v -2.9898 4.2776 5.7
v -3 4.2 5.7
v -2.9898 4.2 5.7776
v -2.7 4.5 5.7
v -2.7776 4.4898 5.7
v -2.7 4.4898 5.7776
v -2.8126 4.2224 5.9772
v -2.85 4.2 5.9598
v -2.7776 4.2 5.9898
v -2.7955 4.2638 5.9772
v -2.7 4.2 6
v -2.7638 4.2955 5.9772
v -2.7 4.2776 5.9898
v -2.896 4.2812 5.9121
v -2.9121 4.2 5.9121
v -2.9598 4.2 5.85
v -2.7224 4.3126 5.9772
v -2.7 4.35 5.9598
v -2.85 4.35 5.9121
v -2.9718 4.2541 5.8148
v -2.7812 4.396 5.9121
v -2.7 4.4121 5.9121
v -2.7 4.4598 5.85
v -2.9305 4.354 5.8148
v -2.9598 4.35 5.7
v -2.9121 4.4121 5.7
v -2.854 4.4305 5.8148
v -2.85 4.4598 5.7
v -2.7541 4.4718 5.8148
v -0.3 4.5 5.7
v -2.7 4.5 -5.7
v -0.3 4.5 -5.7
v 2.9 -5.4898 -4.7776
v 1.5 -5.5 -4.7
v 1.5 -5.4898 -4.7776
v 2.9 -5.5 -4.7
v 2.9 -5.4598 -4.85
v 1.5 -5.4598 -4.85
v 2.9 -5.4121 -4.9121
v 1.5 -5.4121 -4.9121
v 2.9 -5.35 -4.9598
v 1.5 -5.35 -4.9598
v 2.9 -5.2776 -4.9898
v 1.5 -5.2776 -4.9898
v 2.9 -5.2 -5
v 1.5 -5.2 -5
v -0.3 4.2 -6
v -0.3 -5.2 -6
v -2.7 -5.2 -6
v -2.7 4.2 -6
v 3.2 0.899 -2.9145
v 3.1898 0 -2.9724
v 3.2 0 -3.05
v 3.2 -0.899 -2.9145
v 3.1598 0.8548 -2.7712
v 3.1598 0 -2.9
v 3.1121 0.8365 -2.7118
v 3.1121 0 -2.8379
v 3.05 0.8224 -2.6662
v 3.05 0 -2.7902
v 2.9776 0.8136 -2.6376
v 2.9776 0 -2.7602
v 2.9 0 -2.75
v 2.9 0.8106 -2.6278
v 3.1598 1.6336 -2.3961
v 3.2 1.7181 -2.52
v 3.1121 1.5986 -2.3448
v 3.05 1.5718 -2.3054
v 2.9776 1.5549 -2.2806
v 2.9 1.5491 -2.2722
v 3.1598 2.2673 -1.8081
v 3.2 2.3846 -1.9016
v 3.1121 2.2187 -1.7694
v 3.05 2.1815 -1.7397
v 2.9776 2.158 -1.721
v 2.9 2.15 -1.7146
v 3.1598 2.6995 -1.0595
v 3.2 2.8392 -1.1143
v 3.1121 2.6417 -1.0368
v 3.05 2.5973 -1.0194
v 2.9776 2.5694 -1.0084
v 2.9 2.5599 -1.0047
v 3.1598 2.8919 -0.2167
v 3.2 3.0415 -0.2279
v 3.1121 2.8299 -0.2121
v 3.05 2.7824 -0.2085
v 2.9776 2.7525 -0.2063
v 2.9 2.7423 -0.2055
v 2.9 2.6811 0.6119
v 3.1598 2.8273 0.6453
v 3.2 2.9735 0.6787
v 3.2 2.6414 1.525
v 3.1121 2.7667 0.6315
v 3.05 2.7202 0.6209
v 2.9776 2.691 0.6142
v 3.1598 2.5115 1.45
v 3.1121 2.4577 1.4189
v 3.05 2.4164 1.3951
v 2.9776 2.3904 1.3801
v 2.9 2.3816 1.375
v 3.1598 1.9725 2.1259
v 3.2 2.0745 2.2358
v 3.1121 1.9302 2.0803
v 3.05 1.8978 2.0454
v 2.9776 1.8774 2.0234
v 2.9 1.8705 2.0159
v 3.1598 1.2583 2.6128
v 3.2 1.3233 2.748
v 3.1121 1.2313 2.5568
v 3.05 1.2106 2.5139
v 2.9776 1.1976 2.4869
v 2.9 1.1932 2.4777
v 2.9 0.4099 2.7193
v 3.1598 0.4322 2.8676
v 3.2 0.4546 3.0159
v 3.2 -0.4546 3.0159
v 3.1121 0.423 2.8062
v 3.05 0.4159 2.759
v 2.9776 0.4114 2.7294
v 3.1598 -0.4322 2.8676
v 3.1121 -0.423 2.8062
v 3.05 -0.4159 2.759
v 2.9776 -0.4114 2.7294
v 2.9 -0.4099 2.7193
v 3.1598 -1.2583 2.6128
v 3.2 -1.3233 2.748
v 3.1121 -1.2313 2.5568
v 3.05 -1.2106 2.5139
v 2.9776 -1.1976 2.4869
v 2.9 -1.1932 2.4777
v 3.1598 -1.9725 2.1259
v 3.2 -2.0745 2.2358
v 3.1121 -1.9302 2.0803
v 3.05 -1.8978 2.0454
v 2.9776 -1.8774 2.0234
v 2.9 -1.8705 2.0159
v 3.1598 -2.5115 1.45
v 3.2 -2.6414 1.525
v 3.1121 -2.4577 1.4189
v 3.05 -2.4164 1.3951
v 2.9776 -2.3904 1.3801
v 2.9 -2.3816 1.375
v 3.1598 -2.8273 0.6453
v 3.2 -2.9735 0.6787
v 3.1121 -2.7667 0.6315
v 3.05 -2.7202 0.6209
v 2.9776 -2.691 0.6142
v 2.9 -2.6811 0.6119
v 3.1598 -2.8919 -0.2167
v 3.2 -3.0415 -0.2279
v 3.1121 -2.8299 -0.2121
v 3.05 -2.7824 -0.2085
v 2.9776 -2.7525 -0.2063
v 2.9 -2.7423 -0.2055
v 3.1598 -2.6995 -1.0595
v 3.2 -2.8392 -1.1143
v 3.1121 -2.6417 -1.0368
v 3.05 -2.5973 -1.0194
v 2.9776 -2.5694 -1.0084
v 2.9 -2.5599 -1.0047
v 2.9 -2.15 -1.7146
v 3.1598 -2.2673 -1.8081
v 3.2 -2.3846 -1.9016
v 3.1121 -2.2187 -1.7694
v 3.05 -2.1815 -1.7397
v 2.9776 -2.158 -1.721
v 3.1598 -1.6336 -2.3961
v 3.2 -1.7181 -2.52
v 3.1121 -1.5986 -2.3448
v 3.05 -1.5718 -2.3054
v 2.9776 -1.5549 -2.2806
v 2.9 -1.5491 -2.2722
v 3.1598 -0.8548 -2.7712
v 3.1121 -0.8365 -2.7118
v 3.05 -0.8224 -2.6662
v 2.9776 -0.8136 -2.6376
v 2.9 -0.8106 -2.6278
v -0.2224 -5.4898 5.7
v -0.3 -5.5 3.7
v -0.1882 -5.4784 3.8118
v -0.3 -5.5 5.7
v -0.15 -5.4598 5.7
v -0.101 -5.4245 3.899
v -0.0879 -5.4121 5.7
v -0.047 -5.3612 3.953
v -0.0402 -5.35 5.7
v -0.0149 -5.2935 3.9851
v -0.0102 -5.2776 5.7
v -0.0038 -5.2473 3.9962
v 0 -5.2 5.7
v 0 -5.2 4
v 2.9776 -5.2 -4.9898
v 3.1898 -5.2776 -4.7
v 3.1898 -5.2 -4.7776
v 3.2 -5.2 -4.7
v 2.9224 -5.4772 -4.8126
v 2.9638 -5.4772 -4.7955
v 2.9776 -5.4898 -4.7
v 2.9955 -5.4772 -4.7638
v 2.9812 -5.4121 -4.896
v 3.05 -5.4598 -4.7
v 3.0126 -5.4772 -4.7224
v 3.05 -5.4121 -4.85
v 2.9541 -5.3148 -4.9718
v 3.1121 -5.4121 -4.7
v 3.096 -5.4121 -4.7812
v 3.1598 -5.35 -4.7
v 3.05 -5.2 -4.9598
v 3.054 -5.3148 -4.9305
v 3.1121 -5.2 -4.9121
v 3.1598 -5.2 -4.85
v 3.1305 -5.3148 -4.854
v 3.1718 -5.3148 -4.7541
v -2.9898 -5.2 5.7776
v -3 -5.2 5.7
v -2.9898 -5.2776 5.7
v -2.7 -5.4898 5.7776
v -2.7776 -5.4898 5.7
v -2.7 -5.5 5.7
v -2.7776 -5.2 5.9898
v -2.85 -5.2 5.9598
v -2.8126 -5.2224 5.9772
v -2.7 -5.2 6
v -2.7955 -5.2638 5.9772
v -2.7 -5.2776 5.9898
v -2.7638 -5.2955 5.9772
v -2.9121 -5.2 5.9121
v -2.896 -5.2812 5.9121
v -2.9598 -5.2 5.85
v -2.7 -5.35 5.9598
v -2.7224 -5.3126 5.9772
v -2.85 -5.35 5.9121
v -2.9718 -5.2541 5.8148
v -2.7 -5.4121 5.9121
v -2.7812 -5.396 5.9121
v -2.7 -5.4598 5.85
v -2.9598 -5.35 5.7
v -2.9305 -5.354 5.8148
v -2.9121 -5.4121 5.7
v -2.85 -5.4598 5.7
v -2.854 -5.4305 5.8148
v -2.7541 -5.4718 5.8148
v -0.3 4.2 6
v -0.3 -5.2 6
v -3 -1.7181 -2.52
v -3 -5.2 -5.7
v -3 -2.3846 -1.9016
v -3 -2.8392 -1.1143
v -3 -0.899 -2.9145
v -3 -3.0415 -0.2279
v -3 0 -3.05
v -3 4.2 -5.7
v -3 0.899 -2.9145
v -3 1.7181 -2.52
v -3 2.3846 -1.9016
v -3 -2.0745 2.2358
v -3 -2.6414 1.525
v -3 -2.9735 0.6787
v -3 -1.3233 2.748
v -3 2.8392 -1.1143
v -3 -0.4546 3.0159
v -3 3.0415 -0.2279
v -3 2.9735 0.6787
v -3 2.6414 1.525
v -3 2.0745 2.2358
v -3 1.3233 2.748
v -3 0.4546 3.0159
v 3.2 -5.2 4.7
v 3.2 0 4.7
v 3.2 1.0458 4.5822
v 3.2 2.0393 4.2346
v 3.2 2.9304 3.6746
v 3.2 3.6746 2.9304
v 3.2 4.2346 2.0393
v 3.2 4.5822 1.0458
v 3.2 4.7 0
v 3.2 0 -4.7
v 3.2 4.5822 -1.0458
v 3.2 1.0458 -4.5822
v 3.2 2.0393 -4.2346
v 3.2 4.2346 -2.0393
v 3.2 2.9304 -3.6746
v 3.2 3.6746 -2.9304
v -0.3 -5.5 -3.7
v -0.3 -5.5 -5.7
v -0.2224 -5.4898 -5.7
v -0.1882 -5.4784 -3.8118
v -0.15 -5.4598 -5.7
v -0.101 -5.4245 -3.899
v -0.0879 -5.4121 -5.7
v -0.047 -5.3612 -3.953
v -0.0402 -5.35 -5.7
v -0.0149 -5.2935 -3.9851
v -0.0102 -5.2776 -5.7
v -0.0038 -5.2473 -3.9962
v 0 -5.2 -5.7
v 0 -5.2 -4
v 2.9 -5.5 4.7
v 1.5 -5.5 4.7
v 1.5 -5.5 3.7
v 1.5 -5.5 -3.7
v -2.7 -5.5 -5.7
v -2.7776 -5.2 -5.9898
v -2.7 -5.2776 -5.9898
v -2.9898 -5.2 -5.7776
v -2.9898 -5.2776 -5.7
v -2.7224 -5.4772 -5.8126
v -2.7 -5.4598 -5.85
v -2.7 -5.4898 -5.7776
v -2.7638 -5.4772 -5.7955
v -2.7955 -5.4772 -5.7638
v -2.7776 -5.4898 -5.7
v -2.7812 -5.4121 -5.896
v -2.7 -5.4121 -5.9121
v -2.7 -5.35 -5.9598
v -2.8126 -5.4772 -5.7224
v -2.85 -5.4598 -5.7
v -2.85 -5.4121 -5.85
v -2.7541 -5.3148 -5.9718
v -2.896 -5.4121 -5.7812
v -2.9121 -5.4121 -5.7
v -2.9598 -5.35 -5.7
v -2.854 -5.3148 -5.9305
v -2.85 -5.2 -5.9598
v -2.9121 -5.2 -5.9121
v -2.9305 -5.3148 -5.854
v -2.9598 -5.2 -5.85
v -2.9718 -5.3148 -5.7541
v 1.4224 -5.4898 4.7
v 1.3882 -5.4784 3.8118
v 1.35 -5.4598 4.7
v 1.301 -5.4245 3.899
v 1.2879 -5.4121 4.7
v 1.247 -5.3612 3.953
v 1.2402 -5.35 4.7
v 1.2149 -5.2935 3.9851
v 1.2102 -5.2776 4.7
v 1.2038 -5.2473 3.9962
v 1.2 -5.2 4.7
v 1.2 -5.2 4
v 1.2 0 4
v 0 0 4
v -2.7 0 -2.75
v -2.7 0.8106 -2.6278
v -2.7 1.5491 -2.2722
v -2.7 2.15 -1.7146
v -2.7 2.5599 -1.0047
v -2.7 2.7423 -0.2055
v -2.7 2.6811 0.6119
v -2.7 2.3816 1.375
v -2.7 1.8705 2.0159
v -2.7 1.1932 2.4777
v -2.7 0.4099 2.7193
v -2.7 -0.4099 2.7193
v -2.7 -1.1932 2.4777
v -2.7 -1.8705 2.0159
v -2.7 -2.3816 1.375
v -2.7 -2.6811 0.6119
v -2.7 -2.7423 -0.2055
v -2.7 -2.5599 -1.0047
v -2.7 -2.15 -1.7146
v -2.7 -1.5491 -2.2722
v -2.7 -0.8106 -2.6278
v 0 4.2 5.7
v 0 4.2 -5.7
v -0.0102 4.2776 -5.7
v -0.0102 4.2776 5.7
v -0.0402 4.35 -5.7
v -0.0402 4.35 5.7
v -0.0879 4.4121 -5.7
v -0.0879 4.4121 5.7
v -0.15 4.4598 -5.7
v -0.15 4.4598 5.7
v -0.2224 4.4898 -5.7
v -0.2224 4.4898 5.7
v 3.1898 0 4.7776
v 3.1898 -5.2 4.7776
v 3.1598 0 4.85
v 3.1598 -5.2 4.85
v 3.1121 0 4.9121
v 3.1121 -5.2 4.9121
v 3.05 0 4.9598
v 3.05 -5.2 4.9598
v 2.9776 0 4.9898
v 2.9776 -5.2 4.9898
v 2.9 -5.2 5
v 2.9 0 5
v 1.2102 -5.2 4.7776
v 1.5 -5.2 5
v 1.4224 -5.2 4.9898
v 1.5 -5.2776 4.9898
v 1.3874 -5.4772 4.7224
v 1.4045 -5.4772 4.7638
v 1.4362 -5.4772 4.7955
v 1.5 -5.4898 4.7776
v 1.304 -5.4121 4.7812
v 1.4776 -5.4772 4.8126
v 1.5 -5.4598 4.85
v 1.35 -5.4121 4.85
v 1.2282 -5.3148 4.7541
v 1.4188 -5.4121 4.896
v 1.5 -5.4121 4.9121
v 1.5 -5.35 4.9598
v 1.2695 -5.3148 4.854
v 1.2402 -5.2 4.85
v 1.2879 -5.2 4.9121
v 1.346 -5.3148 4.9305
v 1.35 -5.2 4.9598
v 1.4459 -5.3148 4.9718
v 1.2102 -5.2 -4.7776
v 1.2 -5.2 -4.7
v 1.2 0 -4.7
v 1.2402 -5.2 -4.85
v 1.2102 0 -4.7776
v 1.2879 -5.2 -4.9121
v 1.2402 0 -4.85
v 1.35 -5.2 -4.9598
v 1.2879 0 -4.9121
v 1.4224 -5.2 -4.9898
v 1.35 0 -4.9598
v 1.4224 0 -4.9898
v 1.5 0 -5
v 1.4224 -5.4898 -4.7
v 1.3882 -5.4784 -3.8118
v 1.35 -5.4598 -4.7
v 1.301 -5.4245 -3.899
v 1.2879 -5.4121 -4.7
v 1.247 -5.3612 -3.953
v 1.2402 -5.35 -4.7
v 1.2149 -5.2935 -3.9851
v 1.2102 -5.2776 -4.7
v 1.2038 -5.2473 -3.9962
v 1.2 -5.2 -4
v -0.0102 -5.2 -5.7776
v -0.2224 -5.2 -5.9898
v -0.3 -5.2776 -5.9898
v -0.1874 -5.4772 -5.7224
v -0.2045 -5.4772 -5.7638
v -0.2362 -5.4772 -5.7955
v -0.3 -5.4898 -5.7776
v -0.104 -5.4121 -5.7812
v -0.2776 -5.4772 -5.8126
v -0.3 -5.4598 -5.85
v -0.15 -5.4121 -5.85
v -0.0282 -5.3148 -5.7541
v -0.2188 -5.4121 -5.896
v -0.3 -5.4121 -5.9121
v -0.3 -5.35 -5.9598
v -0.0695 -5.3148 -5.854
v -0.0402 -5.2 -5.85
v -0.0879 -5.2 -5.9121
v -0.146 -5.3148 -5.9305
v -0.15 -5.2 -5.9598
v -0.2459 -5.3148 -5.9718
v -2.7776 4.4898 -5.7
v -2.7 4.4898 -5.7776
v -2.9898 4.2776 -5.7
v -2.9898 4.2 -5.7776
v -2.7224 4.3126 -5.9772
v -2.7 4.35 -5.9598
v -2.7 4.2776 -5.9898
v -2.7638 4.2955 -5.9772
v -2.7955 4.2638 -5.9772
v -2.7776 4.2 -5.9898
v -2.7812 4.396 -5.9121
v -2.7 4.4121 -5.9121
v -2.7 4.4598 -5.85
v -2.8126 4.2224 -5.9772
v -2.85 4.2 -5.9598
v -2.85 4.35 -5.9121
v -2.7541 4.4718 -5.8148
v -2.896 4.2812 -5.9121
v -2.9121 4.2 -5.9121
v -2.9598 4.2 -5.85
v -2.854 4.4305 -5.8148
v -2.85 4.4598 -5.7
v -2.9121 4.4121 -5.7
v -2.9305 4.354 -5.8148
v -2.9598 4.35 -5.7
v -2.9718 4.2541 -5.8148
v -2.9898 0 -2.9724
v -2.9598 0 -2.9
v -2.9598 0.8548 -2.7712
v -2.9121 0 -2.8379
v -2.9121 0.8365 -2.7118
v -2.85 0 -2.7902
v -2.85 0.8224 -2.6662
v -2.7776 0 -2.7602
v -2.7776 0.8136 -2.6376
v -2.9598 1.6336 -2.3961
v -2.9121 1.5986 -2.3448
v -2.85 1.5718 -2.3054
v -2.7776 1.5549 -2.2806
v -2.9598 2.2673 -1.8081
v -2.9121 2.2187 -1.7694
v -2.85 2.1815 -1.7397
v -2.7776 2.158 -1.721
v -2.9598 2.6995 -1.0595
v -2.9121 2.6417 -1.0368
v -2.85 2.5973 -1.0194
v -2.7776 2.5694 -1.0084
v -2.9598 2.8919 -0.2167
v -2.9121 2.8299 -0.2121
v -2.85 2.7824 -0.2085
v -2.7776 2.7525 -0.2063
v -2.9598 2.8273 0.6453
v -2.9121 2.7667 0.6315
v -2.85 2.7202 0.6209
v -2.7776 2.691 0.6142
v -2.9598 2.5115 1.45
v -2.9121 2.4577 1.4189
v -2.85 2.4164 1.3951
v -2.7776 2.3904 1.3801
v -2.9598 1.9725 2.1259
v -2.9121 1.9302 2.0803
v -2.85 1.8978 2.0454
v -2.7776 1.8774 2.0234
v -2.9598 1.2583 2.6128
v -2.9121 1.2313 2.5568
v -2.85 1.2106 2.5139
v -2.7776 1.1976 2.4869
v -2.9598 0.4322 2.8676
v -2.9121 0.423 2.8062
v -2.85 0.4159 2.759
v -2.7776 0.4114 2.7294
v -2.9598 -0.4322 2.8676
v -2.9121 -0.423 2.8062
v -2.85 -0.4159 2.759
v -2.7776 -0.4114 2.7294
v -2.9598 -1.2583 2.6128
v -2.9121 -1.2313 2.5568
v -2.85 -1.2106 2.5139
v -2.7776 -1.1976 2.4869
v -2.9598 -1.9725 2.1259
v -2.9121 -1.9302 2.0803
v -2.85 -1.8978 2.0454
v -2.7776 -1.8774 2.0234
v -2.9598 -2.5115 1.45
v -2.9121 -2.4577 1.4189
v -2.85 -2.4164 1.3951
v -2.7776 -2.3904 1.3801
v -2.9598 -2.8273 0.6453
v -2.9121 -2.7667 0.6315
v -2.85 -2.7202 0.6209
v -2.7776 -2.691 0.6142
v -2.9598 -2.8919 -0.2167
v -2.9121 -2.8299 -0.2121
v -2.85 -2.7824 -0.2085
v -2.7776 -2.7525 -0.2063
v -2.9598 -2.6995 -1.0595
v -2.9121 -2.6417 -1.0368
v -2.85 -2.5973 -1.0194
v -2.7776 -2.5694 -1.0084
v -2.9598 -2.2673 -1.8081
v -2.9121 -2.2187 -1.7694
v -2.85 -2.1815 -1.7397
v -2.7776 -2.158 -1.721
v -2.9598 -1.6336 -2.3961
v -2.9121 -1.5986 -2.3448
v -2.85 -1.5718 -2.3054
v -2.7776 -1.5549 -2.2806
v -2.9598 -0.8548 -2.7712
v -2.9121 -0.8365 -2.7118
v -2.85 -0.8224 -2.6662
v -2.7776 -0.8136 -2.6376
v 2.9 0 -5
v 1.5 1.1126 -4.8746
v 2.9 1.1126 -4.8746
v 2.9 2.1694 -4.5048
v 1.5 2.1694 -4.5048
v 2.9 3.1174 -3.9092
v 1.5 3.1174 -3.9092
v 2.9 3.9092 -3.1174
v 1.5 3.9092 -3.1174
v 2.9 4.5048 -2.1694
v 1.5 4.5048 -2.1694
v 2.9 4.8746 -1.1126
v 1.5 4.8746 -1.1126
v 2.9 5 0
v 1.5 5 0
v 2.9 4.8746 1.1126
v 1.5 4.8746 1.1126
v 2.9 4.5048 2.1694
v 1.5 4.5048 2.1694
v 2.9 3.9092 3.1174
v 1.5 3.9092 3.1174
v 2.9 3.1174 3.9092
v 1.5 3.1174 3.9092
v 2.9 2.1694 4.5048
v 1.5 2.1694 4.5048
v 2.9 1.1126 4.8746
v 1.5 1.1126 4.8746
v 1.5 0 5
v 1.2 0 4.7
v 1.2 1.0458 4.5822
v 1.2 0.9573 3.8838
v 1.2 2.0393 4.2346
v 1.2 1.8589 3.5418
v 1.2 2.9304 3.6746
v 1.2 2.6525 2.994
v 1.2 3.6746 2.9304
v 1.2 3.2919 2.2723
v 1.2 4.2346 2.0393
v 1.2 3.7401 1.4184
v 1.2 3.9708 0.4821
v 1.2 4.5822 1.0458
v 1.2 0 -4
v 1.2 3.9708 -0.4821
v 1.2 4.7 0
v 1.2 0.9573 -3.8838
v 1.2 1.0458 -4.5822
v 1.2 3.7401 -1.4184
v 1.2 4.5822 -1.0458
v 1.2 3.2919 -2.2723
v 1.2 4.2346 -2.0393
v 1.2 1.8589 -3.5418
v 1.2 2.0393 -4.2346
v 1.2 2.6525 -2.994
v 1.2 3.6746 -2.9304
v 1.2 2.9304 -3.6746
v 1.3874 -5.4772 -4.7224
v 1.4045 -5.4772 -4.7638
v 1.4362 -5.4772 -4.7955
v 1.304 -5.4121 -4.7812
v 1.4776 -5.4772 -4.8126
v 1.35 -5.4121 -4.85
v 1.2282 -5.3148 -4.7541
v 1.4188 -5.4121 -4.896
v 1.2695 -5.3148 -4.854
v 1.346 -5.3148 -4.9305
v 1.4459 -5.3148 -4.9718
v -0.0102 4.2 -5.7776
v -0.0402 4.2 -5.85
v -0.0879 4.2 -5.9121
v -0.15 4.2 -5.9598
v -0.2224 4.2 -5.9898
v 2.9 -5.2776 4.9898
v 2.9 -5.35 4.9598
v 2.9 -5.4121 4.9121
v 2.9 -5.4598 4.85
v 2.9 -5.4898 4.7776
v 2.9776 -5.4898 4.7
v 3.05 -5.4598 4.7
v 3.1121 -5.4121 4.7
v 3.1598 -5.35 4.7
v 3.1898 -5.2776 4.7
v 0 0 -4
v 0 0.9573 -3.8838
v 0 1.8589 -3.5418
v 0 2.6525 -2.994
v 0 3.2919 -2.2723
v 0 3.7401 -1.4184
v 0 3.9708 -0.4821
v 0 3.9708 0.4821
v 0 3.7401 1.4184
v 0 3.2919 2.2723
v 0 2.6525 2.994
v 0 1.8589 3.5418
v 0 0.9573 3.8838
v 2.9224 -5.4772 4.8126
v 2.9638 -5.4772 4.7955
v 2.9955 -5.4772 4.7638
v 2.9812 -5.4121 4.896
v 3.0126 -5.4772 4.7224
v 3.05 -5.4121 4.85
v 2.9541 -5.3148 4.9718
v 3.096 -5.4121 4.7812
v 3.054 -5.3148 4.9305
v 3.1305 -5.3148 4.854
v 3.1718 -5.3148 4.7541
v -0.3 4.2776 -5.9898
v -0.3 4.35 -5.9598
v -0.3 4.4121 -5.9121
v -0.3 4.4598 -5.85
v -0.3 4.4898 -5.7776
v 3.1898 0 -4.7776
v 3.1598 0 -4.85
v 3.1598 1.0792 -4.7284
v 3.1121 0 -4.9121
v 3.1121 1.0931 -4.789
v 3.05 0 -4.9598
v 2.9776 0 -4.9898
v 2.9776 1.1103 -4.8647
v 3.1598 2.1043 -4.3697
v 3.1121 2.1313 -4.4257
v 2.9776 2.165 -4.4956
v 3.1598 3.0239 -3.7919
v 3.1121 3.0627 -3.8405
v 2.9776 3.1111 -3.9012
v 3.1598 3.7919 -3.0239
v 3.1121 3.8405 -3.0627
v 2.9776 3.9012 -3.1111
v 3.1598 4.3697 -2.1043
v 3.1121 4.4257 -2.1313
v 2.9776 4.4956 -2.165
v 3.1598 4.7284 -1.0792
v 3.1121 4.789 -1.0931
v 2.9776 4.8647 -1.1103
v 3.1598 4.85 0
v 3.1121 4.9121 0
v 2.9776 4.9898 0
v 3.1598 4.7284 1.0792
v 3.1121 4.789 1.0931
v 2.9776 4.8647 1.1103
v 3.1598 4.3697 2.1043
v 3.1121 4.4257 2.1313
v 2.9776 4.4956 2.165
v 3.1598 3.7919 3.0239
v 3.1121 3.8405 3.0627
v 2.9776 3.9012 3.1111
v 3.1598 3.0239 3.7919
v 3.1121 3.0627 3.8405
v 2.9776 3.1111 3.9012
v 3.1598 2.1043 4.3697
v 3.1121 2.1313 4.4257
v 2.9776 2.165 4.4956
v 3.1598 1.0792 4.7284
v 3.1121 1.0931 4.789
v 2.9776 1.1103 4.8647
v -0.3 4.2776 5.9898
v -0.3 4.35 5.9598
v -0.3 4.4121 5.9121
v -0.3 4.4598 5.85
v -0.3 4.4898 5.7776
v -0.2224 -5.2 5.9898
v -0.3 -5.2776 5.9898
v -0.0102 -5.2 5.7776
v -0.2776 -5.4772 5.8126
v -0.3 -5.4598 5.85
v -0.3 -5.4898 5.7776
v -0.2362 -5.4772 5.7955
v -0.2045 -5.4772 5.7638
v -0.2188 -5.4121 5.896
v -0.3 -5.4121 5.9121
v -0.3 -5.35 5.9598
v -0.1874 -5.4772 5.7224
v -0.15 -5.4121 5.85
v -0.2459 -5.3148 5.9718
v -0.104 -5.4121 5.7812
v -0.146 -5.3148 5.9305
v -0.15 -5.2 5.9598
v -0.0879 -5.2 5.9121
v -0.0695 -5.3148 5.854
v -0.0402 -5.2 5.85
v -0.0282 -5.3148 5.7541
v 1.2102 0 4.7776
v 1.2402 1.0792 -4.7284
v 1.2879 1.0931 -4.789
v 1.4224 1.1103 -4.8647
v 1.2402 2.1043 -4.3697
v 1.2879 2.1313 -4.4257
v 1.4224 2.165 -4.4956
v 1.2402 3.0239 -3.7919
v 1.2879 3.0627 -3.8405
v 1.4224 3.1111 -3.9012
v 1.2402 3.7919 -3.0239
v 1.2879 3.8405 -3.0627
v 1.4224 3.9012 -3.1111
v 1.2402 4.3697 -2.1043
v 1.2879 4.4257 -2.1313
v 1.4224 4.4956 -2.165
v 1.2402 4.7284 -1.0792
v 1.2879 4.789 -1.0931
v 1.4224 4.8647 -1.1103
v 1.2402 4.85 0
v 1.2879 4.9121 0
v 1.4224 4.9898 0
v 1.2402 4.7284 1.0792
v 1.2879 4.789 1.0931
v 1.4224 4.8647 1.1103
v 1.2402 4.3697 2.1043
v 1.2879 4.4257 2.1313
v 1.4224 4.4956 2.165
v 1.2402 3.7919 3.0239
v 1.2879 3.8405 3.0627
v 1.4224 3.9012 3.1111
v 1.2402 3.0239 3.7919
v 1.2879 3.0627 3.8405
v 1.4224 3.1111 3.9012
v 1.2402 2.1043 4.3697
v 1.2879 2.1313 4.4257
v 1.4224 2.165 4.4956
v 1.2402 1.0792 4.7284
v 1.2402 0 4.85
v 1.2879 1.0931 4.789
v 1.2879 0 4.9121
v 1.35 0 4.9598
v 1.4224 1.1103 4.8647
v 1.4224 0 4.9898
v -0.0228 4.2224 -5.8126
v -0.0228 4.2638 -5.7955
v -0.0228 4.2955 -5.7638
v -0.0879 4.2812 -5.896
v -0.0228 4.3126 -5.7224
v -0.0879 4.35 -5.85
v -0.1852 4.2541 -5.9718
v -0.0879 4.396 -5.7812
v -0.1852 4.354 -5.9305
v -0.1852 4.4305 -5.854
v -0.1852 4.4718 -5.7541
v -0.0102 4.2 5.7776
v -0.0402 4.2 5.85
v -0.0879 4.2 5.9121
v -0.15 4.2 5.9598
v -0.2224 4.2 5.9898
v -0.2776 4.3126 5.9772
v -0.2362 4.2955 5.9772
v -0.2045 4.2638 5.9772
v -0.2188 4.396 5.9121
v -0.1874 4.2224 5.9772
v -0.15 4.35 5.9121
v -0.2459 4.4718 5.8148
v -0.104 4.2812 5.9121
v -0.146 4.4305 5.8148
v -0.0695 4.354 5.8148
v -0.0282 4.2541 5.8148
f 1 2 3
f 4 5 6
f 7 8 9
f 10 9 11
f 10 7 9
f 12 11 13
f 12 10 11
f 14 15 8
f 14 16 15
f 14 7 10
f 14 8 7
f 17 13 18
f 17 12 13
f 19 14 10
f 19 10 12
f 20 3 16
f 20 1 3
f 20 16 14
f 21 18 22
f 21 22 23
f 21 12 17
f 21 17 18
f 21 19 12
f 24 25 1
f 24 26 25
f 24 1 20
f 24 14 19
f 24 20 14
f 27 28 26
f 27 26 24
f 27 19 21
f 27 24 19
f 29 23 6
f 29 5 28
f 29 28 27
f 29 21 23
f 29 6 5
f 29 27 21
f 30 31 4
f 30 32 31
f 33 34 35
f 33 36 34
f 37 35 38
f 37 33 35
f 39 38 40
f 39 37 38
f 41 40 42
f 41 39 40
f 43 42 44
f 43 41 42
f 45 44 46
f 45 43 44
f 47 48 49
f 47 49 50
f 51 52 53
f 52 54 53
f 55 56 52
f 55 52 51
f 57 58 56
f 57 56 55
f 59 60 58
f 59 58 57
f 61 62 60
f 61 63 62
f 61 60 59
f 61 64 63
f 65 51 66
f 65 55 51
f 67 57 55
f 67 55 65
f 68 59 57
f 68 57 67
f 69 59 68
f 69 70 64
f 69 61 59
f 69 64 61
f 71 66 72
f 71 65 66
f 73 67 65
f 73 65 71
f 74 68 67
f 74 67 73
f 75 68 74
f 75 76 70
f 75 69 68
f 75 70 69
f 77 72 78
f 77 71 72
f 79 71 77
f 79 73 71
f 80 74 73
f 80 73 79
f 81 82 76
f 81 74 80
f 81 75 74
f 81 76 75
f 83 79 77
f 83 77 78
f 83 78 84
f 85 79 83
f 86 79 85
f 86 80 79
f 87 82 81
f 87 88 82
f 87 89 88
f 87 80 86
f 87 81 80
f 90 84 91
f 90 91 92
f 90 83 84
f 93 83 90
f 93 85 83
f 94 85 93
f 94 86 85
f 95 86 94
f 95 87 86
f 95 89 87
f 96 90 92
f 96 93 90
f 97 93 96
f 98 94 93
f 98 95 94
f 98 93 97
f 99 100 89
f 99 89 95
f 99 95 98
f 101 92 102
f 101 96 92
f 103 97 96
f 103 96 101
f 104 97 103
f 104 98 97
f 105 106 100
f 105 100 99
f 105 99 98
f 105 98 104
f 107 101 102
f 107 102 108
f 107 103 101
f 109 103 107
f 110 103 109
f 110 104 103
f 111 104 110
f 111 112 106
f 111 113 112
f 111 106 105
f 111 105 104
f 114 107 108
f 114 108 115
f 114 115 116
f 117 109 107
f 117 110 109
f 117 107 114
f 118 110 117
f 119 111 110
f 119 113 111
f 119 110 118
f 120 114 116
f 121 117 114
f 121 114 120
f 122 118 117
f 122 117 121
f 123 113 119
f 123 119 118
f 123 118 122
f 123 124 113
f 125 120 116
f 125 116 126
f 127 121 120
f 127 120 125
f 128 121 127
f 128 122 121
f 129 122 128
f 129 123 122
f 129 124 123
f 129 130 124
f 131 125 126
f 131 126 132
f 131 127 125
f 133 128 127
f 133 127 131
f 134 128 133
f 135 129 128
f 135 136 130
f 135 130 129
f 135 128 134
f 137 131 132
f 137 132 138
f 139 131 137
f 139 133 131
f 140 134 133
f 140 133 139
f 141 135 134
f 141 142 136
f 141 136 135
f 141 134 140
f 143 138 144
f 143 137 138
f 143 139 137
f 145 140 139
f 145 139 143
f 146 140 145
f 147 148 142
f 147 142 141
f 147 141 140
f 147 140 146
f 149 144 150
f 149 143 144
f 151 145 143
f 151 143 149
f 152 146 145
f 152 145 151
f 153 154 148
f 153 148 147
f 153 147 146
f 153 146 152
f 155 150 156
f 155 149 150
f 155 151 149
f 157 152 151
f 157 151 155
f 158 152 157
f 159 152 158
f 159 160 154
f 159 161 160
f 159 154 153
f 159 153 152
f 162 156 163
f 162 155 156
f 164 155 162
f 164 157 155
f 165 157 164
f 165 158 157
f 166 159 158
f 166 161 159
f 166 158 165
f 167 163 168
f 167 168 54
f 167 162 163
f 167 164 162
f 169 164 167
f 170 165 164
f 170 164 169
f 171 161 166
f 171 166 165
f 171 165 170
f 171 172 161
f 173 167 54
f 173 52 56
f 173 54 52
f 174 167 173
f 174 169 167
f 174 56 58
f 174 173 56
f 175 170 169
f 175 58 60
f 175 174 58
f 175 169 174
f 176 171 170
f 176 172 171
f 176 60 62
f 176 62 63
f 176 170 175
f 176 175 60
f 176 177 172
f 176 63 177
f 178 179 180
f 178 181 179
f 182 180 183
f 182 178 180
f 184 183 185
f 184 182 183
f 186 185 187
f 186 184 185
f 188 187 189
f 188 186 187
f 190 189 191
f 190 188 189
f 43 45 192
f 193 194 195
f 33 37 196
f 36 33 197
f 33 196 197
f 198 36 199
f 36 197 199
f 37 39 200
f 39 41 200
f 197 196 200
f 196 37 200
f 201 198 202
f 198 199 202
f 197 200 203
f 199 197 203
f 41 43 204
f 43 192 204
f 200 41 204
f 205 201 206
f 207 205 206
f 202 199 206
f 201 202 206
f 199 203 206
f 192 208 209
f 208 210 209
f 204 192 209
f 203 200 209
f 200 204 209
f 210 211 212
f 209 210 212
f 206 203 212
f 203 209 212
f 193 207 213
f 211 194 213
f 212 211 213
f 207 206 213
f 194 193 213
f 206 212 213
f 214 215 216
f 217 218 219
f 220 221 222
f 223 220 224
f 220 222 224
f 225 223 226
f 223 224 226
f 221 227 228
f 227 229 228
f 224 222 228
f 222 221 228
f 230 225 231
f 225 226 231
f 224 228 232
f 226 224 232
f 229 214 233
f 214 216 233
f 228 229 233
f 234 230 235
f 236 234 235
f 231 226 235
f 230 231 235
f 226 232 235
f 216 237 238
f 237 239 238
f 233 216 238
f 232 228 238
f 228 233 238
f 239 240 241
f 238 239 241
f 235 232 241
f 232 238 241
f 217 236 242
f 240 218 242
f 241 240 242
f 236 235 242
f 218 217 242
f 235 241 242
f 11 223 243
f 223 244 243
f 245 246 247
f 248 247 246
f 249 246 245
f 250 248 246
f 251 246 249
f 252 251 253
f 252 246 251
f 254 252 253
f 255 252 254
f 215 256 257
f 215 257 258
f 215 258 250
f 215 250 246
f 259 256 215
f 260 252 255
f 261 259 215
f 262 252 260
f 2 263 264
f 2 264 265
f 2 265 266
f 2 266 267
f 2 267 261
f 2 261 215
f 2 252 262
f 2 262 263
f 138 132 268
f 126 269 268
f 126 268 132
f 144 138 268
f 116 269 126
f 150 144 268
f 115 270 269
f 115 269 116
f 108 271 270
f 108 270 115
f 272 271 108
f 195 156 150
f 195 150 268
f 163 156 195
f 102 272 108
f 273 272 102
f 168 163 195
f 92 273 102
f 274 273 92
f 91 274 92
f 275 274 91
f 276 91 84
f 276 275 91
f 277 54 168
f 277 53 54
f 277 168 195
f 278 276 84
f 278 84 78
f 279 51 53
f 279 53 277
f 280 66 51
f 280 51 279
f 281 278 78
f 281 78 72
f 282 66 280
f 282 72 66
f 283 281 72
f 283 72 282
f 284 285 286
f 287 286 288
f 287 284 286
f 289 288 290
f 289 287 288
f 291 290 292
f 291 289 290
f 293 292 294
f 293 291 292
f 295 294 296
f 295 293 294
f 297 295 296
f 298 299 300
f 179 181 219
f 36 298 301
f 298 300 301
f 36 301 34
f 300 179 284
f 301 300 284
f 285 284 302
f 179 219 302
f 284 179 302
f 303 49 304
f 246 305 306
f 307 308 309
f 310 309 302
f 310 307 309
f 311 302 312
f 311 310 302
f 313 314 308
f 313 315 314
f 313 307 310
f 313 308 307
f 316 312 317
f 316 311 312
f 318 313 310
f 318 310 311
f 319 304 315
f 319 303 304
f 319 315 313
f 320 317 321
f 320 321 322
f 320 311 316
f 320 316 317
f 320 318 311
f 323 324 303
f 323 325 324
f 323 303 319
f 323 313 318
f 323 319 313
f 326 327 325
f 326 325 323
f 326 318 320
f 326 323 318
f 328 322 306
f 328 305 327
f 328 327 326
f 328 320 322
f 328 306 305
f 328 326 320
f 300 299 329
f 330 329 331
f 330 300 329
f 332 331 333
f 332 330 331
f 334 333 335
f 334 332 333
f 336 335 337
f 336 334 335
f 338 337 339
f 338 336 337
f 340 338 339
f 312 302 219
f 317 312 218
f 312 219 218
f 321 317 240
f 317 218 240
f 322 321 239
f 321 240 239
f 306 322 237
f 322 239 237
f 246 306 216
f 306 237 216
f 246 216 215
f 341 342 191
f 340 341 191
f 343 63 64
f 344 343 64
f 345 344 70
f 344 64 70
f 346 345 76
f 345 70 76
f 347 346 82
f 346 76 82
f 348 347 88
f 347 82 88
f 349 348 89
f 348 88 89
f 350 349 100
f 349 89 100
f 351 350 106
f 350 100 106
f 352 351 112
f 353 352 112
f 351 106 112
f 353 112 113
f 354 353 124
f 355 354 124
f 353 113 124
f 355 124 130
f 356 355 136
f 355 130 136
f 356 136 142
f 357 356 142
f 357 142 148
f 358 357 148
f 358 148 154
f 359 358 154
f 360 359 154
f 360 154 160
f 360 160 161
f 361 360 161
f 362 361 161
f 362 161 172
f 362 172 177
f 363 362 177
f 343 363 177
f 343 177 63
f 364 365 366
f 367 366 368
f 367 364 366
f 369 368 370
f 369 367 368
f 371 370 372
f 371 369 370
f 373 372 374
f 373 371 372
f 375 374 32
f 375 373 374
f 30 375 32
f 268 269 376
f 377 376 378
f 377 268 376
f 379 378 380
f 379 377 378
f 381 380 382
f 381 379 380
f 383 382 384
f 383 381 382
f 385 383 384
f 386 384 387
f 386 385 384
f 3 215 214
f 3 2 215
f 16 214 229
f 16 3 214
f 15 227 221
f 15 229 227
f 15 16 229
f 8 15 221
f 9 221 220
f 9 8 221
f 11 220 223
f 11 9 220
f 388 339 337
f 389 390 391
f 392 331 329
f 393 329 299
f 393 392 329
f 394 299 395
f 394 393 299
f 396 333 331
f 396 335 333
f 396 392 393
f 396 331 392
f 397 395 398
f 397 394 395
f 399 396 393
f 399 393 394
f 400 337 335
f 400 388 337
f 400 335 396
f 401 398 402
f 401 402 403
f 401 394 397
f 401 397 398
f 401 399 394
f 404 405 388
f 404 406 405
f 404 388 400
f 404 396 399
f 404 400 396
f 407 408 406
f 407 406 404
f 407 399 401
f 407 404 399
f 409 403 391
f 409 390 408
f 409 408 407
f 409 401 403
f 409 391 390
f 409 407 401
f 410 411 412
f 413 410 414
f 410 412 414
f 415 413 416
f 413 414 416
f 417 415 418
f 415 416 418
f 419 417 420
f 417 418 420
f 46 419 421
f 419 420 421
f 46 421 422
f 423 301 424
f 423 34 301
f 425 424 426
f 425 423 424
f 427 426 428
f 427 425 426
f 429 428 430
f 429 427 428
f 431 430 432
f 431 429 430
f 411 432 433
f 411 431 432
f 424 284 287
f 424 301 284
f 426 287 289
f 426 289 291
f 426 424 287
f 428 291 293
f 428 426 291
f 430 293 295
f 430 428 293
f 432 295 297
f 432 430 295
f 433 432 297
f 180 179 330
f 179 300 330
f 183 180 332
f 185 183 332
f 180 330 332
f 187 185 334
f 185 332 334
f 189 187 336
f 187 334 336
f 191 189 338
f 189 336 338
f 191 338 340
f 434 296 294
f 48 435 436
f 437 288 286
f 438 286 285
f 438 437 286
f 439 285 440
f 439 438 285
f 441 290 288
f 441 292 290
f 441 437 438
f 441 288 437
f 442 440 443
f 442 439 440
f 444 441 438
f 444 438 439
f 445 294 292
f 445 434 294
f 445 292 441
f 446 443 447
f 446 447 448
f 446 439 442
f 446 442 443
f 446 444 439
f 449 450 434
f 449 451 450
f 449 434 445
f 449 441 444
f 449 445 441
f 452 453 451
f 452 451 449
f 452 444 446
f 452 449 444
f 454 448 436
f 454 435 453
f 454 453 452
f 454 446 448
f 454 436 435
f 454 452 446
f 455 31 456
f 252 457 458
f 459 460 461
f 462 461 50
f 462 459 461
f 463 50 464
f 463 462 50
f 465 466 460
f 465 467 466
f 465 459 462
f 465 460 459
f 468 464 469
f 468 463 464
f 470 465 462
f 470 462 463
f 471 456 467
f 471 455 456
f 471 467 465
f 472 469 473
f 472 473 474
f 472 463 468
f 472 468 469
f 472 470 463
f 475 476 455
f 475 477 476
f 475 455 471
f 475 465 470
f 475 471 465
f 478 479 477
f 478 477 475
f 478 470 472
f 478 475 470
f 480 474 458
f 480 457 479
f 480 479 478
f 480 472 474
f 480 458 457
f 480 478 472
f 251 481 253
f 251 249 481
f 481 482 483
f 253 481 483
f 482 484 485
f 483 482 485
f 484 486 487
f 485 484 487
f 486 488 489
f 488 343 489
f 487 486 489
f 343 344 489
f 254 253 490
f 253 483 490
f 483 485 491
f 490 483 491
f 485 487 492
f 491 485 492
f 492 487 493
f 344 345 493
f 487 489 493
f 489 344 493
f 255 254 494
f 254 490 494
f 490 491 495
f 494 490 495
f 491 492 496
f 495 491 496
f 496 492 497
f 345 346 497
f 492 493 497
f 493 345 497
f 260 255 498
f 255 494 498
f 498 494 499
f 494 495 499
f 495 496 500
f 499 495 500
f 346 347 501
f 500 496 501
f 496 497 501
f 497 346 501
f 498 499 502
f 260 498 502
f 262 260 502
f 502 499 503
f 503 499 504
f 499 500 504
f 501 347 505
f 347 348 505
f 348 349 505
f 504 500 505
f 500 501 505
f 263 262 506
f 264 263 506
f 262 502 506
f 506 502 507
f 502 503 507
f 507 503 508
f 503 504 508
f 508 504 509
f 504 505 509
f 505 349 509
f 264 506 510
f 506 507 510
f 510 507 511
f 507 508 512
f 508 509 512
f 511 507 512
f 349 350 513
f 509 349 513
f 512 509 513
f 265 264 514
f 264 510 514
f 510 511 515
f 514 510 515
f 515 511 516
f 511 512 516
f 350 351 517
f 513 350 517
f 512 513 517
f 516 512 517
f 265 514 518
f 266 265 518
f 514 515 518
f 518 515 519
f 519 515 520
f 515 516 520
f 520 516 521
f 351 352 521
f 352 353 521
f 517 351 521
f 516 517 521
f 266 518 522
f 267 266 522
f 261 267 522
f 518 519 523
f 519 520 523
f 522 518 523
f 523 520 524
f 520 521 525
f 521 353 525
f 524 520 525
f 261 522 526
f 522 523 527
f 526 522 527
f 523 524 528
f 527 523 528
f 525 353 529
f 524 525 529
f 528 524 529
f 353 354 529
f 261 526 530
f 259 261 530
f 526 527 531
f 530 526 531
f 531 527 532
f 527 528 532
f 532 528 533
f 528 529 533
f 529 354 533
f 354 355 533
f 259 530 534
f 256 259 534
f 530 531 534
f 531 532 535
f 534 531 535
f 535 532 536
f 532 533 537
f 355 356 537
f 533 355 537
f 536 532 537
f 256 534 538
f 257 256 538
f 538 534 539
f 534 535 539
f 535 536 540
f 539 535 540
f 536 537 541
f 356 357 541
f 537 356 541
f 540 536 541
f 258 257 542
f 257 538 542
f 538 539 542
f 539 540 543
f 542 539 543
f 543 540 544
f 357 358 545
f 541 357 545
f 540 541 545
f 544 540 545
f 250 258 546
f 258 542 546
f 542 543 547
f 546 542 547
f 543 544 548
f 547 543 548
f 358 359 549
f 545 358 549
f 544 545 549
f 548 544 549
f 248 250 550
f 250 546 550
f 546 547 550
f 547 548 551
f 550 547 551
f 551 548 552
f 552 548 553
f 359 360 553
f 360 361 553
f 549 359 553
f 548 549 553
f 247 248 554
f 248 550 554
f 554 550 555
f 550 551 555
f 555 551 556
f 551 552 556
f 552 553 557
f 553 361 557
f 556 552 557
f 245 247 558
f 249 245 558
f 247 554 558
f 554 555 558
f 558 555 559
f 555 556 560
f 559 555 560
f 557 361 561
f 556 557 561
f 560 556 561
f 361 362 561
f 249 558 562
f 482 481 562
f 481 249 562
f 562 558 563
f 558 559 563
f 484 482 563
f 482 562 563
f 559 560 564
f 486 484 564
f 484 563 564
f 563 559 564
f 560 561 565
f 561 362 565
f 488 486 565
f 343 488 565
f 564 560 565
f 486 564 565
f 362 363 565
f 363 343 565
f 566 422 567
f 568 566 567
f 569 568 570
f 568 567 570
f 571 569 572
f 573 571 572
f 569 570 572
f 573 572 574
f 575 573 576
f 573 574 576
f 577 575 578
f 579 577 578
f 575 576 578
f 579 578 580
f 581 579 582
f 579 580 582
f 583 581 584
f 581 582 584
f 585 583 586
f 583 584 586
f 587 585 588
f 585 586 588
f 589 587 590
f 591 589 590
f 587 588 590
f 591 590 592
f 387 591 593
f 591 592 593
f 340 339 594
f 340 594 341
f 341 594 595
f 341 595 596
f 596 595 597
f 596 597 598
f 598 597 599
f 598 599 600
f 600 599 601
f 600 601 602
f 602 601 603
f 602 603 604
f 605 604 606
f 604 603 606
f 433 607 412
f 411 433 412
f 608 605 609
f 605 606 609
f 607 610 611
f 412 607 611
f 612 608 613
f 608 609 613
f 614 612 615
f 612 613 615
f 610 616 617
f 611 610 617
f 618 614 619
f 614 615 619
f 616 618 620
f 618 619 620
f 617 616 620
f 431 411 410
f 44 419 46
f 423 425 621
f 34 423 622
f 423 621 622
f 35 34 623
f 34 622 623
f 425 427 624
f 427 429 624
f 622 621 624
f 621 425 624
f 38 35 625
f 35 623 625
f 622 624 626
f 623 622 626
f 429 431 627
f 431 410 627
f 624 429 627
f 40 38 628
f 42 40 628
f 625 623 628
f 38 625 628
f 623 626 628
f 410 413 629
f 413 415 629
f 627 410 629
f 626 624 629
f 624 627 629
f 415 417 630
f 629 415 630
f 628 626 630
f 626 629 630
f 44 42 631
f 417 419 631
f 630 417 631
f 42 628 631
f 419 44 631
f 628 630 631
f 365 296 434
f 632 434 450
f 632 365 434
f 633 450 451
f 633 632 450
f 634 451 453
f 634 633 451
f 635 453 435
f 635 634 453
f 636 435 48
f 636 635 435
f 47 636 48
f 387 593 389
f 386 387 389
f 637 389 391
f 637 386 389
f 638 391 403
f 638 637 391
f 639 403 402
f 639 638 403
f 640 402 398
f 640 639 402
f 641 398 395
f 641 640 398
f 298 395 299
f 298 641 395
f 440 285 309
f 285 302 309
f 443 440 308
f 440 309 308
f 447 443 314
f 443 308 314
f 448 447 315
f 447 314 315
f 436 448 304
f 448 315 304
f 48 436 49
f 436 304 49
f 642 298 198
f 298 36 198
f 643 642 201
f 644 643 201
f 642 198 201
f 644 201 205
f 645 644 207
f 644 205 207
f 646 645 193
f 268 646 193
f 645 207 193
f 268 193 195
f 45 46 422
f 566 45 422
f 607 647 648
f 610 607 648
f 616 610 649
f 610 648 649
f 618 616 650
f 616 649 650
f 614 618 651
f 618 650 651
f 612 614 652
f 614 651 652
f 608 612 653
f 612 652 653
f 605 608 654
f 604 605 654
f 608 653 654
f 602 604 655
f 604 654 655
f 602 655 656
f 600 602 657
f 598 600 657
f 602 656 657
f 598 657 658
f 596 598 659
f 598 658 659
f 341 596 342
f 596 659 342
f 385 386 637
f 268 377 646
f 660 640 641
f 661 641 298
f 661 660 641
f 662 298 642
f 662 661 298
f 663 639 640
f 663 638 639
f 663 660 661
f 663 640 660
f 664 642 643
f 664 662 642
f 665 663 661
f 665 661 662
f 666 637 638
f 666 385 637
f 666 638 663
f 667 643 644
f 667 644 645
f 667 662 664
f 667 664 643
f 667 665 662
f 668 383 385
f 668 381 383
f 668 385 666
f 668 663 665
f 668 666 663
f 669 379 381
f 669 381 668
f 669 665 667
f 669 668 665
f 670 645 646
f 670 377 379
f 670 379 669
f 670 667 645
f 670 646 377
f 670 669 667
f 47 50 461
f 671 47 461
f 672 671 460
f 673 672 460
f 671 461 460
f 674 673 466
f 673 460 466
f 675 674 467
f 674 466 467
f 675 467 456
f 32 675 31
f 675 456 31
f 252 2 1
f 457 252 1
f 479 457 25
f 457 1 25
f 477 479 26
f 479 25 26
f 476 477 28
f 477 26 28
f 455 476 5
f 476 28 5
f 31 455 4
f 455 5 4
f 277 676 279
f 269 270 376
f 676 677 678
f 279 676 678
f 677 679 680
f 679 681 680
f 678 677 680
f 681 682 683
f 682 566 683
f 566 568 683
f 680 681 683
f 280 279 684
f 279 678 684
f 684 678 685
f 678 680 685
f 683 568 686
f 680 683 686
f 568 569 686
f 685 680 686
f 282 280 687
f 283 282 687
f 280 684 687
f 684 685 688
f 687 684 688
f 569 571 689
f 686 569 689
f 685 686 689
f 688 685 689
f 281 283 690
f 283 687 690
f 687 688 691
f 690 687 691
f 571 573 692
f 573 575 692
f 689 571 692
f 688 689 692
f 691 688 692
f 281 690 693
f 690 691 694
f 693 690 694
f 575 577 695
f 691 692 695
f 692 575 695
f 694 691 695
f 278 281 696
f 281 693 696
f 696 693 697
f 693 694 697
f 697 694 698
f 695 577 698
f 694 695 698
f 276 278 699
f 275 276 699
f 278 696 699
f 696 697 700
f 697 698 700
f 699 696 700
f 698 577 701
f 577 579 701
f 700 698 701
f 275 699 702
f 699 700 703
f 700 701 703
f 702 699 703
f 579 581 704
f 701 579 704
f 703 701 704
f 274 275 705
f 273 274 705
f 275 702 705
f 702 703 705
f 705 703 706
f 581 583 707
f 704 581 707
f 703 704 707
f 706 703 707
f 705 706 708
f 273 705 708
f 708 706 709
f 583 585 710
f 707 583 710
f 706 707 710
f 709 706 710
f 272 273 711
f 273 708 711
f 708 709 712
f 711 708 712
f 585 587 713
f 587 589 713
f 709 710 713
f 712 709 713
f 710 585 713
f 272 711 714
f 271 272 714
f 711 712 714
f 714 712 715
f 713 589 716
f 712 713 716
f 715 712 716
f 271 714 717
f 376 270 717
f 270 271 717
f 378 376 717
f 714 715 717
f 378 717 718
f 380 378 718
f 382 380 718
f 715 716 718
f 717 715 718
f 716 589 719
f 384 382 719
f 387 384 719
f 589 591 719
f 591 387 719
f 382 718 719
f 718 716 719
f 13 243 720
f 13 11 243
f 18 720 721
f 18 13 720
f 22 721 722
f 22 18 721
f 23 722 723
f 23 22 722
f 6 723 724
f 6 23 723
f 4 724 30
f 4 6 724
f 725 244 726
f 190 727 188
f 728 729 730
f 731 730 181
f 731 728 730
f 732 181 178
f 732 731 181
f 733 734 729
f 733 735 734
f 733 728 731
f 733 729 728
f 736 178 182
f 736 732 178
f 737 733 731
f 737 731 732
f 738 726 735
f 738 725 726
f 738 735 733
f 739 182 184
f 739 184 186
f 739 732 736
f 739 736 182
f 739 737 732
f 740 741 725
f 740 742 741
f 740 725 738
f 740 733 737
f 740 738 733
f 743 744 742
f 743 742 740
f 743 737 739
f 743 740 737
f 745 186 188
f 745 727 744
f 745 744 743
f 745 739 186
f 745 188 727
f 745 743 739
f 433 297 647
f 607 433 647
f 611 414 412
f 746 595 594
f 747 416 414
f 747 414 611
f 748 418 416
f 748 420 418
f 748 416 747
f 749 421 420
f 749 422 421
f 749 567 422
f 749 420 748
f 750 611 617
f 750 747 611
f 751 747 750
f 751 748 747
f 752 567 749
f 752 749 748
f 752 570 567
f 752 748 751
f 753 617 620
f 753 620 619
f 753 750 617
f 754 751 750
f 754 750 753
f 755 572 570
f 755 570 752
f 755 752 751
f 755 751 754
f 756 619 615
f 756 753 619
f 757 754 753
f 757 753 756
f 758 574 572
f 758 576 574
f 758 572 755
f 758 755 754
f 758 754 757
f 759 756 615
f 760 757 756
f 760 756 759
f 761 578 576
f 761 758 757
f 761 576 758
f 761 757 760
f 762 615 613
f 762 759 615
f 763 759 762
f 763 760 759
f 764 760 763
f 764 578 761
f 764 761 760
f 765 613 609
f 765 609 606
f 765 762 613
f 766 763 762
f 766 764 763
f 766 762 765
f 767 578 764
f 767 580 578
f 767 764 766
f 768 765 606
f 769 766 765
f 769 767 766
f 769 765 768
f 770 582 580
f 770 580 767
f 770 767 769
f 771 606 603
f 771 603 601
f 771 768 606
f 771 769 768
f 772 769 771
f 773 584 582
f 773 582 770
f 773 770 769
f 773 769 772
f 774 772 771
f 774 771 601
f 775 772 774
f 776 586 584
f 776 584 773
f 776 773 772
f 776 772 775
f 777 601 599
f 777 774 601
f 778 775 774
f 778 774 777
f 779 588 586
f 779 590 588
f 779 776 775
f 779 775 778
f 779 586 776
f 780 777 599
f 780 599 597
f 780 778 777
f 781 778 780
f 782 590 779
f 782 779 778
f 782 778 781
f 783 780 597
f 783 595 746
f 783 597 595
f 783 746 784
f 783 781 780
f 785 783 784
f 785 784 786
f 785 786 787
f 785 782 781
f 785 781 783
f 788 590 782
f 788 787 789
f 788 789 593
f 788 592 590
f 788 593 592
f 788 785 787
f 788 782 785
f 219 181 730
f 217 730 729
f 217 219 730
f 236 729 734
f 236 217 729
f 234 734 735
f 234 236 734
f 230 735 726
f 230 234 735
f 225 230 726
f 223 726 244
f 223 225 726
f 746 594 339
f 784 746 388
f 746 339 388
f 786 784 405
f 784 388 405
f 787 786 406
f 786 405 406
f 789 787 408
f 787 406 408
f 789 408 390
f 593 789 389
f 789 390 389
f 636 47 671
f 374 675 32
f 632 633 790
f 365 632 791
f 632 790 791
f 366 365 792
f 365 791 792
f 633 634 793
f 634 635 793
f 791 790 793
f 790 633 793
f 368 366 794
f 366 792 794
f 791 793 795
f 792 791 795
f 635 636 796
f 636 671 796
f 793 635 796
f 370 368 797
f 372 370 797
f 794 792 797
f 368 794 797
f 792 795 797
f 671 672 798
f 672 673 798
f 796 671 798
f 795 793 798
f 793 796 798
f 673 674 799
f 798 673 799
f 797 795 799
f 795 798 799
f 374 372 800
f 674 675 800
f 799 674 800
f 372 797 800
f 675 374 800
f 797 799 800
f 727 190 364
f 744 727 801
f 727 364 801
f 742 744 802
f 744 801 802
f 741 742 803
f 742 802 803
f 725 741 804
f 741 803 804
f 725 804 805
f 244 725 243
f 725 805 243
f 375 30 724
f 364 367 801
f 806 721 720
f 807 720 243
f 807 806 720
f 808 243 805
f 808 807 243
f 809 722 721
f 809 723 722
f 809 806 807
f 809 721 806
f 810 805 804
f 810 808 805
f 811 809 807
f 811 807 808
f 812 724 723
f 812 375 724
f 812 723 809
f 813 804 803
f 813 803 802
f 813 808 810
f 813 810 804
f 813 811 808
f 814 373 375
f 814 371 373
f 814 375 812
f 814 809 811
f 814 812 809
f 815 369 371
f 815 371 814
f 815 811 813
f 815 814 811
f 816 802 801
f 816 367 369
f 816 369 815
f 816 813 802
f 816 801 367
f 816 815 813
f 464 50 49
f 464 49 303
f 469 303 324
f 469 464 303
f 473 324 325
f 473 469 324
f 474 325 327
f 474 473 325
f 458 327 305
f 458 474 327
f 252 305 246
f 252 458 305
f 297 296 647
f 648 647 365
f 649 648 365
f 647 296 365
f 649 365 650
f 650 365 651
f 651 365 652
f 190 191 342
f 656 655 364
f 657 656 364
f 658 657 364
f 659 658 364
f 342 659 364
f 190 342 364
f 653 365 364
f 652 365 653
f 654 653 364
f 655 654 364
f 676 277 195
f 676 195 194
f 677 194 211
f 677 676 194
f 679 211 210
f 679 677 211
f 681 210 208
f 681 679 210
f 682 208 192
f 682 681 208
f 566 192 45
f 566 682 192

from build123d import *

# Parameters (mm, degrees)
BOSS_EXTRUDE1_DEPTH = 1.2
SKETCH2_W           = 12
SKETCH2_H           = 10
BOSS_EXTRUDE2_DEPTH = 3
BOSS_EXTRUDE3_DEPTH = 2
CUT_EXTRUDE1_REACH  = 8.2
SKETCH4_R           = 2.75
FILLET1_R           = 0.3


with BuildPart() as part:
    # Sketch1 → Boss-Extrude1 (new body)
    with BuildSketch(Plane(origin=(0, 0, 0), x_dir=(0, 0, -1), z_dir=(1, 0, 0))):
        with BuildLine():
            Line((-4, 0), (-4, -5.5))
            Line((-4, -5.5), (4, -5.5))
            Line((4, -5.5), (4, 0))
            ThreePointArc((4, 0), (0, 4), (-4, 0))
        make_face()
    extrude(amount=BOSS_EXTRUDE1_DEPTH)

    # Sketch2 → Boss-Extrude2 (add)
    with BuildSketch(Plane.ZY):
        with Locations((0, -0.5)):
            Rectangle(SKETCH2_W, SKETCH2_H)
    extrude(amount=BOSS_EXTRUDE2_DEPTH)

    # Sketch3 → Boss-Extrude3 (add)
    with BuildSketch(Plane(origin=(1.2, 0, 0), x_dir=(0, 0, -1), z_dir=(1, 0, 0))):
        with BuildLine():
            Line((-5, 0), (-5, -5.5))
            Line((-5, -5.5), (5, -5.5))
            Line((5, -5.5), (5, 0))
            ThreePointArc((5, 0), (0, 5), (-5, 0))
        make_face()
    extrude(amount=BOSS_EXTRUDE3_DEPTH)

    # Sketch4 → Cut-Extrude1 (cut, up to next)
    with BuildSketch(Plane(origin=(3.2, 0, 0), x_dir=(0, 0, -1), z_dir=(1, 0, 0)), mode=Mode.PRIVATE) as cut_extrude1_sk1:
        Circle(SKETCH4_R)
    cut_extrude1_tool1 = extrude(cut_extrude1_sk1.sketch, amount=-CUT_EXTRUDE1_REACH, mode=Mode.PRIVATE) & part.part
    add(cut_extrude1_tool1.solids().sort_by_distance((3.2, 0, 0))[0], mode=Mode.SUBTRACT)

    # Fillet1
    fillet1_edges = [part.edges().sort_by_distance(p)[0] for p in [
        (1.2, -2.75, -5),
        (1.2, -2.75, 5),
        (3.2, -2.75, -5),
        (3.2, -2.75, 5),
        (-3, 0, 2.75),
        (-3, 4.5, 0),
        (-1.5, 4.5, -6),
        (-3, -0.5, -6),
        (0, -0.5, -6),
        (0, -5.5, -5),
        (-1.5, -5.5, -6),
        (-3, -5.5, 0),
        (-3, -0.5, 6),
        (0, 4.5, 0),
        (-1.5, 4.5, 6),
        (0, -0.5, 6),
        (-1.5, -5.5, 6),
        (0, -5.5, 5),
        (0.6, -5.5, -4),
        (1.2, -5.5, -4.5),
        (0.6, -5.5, 4),
        (1.2, -5.5, 4.5),
        (2.2, -5.5, -5),
        (2.2, -5.5, 5),
        (1.2, 5, 0),
        (3.2, 0, 2.75),
        (3.2, -5.5, 0),
        (3.2, 5, 0),
    ]]
    fillet(fillet1_edges, radius=FILLET1_R)


solid = part.part
